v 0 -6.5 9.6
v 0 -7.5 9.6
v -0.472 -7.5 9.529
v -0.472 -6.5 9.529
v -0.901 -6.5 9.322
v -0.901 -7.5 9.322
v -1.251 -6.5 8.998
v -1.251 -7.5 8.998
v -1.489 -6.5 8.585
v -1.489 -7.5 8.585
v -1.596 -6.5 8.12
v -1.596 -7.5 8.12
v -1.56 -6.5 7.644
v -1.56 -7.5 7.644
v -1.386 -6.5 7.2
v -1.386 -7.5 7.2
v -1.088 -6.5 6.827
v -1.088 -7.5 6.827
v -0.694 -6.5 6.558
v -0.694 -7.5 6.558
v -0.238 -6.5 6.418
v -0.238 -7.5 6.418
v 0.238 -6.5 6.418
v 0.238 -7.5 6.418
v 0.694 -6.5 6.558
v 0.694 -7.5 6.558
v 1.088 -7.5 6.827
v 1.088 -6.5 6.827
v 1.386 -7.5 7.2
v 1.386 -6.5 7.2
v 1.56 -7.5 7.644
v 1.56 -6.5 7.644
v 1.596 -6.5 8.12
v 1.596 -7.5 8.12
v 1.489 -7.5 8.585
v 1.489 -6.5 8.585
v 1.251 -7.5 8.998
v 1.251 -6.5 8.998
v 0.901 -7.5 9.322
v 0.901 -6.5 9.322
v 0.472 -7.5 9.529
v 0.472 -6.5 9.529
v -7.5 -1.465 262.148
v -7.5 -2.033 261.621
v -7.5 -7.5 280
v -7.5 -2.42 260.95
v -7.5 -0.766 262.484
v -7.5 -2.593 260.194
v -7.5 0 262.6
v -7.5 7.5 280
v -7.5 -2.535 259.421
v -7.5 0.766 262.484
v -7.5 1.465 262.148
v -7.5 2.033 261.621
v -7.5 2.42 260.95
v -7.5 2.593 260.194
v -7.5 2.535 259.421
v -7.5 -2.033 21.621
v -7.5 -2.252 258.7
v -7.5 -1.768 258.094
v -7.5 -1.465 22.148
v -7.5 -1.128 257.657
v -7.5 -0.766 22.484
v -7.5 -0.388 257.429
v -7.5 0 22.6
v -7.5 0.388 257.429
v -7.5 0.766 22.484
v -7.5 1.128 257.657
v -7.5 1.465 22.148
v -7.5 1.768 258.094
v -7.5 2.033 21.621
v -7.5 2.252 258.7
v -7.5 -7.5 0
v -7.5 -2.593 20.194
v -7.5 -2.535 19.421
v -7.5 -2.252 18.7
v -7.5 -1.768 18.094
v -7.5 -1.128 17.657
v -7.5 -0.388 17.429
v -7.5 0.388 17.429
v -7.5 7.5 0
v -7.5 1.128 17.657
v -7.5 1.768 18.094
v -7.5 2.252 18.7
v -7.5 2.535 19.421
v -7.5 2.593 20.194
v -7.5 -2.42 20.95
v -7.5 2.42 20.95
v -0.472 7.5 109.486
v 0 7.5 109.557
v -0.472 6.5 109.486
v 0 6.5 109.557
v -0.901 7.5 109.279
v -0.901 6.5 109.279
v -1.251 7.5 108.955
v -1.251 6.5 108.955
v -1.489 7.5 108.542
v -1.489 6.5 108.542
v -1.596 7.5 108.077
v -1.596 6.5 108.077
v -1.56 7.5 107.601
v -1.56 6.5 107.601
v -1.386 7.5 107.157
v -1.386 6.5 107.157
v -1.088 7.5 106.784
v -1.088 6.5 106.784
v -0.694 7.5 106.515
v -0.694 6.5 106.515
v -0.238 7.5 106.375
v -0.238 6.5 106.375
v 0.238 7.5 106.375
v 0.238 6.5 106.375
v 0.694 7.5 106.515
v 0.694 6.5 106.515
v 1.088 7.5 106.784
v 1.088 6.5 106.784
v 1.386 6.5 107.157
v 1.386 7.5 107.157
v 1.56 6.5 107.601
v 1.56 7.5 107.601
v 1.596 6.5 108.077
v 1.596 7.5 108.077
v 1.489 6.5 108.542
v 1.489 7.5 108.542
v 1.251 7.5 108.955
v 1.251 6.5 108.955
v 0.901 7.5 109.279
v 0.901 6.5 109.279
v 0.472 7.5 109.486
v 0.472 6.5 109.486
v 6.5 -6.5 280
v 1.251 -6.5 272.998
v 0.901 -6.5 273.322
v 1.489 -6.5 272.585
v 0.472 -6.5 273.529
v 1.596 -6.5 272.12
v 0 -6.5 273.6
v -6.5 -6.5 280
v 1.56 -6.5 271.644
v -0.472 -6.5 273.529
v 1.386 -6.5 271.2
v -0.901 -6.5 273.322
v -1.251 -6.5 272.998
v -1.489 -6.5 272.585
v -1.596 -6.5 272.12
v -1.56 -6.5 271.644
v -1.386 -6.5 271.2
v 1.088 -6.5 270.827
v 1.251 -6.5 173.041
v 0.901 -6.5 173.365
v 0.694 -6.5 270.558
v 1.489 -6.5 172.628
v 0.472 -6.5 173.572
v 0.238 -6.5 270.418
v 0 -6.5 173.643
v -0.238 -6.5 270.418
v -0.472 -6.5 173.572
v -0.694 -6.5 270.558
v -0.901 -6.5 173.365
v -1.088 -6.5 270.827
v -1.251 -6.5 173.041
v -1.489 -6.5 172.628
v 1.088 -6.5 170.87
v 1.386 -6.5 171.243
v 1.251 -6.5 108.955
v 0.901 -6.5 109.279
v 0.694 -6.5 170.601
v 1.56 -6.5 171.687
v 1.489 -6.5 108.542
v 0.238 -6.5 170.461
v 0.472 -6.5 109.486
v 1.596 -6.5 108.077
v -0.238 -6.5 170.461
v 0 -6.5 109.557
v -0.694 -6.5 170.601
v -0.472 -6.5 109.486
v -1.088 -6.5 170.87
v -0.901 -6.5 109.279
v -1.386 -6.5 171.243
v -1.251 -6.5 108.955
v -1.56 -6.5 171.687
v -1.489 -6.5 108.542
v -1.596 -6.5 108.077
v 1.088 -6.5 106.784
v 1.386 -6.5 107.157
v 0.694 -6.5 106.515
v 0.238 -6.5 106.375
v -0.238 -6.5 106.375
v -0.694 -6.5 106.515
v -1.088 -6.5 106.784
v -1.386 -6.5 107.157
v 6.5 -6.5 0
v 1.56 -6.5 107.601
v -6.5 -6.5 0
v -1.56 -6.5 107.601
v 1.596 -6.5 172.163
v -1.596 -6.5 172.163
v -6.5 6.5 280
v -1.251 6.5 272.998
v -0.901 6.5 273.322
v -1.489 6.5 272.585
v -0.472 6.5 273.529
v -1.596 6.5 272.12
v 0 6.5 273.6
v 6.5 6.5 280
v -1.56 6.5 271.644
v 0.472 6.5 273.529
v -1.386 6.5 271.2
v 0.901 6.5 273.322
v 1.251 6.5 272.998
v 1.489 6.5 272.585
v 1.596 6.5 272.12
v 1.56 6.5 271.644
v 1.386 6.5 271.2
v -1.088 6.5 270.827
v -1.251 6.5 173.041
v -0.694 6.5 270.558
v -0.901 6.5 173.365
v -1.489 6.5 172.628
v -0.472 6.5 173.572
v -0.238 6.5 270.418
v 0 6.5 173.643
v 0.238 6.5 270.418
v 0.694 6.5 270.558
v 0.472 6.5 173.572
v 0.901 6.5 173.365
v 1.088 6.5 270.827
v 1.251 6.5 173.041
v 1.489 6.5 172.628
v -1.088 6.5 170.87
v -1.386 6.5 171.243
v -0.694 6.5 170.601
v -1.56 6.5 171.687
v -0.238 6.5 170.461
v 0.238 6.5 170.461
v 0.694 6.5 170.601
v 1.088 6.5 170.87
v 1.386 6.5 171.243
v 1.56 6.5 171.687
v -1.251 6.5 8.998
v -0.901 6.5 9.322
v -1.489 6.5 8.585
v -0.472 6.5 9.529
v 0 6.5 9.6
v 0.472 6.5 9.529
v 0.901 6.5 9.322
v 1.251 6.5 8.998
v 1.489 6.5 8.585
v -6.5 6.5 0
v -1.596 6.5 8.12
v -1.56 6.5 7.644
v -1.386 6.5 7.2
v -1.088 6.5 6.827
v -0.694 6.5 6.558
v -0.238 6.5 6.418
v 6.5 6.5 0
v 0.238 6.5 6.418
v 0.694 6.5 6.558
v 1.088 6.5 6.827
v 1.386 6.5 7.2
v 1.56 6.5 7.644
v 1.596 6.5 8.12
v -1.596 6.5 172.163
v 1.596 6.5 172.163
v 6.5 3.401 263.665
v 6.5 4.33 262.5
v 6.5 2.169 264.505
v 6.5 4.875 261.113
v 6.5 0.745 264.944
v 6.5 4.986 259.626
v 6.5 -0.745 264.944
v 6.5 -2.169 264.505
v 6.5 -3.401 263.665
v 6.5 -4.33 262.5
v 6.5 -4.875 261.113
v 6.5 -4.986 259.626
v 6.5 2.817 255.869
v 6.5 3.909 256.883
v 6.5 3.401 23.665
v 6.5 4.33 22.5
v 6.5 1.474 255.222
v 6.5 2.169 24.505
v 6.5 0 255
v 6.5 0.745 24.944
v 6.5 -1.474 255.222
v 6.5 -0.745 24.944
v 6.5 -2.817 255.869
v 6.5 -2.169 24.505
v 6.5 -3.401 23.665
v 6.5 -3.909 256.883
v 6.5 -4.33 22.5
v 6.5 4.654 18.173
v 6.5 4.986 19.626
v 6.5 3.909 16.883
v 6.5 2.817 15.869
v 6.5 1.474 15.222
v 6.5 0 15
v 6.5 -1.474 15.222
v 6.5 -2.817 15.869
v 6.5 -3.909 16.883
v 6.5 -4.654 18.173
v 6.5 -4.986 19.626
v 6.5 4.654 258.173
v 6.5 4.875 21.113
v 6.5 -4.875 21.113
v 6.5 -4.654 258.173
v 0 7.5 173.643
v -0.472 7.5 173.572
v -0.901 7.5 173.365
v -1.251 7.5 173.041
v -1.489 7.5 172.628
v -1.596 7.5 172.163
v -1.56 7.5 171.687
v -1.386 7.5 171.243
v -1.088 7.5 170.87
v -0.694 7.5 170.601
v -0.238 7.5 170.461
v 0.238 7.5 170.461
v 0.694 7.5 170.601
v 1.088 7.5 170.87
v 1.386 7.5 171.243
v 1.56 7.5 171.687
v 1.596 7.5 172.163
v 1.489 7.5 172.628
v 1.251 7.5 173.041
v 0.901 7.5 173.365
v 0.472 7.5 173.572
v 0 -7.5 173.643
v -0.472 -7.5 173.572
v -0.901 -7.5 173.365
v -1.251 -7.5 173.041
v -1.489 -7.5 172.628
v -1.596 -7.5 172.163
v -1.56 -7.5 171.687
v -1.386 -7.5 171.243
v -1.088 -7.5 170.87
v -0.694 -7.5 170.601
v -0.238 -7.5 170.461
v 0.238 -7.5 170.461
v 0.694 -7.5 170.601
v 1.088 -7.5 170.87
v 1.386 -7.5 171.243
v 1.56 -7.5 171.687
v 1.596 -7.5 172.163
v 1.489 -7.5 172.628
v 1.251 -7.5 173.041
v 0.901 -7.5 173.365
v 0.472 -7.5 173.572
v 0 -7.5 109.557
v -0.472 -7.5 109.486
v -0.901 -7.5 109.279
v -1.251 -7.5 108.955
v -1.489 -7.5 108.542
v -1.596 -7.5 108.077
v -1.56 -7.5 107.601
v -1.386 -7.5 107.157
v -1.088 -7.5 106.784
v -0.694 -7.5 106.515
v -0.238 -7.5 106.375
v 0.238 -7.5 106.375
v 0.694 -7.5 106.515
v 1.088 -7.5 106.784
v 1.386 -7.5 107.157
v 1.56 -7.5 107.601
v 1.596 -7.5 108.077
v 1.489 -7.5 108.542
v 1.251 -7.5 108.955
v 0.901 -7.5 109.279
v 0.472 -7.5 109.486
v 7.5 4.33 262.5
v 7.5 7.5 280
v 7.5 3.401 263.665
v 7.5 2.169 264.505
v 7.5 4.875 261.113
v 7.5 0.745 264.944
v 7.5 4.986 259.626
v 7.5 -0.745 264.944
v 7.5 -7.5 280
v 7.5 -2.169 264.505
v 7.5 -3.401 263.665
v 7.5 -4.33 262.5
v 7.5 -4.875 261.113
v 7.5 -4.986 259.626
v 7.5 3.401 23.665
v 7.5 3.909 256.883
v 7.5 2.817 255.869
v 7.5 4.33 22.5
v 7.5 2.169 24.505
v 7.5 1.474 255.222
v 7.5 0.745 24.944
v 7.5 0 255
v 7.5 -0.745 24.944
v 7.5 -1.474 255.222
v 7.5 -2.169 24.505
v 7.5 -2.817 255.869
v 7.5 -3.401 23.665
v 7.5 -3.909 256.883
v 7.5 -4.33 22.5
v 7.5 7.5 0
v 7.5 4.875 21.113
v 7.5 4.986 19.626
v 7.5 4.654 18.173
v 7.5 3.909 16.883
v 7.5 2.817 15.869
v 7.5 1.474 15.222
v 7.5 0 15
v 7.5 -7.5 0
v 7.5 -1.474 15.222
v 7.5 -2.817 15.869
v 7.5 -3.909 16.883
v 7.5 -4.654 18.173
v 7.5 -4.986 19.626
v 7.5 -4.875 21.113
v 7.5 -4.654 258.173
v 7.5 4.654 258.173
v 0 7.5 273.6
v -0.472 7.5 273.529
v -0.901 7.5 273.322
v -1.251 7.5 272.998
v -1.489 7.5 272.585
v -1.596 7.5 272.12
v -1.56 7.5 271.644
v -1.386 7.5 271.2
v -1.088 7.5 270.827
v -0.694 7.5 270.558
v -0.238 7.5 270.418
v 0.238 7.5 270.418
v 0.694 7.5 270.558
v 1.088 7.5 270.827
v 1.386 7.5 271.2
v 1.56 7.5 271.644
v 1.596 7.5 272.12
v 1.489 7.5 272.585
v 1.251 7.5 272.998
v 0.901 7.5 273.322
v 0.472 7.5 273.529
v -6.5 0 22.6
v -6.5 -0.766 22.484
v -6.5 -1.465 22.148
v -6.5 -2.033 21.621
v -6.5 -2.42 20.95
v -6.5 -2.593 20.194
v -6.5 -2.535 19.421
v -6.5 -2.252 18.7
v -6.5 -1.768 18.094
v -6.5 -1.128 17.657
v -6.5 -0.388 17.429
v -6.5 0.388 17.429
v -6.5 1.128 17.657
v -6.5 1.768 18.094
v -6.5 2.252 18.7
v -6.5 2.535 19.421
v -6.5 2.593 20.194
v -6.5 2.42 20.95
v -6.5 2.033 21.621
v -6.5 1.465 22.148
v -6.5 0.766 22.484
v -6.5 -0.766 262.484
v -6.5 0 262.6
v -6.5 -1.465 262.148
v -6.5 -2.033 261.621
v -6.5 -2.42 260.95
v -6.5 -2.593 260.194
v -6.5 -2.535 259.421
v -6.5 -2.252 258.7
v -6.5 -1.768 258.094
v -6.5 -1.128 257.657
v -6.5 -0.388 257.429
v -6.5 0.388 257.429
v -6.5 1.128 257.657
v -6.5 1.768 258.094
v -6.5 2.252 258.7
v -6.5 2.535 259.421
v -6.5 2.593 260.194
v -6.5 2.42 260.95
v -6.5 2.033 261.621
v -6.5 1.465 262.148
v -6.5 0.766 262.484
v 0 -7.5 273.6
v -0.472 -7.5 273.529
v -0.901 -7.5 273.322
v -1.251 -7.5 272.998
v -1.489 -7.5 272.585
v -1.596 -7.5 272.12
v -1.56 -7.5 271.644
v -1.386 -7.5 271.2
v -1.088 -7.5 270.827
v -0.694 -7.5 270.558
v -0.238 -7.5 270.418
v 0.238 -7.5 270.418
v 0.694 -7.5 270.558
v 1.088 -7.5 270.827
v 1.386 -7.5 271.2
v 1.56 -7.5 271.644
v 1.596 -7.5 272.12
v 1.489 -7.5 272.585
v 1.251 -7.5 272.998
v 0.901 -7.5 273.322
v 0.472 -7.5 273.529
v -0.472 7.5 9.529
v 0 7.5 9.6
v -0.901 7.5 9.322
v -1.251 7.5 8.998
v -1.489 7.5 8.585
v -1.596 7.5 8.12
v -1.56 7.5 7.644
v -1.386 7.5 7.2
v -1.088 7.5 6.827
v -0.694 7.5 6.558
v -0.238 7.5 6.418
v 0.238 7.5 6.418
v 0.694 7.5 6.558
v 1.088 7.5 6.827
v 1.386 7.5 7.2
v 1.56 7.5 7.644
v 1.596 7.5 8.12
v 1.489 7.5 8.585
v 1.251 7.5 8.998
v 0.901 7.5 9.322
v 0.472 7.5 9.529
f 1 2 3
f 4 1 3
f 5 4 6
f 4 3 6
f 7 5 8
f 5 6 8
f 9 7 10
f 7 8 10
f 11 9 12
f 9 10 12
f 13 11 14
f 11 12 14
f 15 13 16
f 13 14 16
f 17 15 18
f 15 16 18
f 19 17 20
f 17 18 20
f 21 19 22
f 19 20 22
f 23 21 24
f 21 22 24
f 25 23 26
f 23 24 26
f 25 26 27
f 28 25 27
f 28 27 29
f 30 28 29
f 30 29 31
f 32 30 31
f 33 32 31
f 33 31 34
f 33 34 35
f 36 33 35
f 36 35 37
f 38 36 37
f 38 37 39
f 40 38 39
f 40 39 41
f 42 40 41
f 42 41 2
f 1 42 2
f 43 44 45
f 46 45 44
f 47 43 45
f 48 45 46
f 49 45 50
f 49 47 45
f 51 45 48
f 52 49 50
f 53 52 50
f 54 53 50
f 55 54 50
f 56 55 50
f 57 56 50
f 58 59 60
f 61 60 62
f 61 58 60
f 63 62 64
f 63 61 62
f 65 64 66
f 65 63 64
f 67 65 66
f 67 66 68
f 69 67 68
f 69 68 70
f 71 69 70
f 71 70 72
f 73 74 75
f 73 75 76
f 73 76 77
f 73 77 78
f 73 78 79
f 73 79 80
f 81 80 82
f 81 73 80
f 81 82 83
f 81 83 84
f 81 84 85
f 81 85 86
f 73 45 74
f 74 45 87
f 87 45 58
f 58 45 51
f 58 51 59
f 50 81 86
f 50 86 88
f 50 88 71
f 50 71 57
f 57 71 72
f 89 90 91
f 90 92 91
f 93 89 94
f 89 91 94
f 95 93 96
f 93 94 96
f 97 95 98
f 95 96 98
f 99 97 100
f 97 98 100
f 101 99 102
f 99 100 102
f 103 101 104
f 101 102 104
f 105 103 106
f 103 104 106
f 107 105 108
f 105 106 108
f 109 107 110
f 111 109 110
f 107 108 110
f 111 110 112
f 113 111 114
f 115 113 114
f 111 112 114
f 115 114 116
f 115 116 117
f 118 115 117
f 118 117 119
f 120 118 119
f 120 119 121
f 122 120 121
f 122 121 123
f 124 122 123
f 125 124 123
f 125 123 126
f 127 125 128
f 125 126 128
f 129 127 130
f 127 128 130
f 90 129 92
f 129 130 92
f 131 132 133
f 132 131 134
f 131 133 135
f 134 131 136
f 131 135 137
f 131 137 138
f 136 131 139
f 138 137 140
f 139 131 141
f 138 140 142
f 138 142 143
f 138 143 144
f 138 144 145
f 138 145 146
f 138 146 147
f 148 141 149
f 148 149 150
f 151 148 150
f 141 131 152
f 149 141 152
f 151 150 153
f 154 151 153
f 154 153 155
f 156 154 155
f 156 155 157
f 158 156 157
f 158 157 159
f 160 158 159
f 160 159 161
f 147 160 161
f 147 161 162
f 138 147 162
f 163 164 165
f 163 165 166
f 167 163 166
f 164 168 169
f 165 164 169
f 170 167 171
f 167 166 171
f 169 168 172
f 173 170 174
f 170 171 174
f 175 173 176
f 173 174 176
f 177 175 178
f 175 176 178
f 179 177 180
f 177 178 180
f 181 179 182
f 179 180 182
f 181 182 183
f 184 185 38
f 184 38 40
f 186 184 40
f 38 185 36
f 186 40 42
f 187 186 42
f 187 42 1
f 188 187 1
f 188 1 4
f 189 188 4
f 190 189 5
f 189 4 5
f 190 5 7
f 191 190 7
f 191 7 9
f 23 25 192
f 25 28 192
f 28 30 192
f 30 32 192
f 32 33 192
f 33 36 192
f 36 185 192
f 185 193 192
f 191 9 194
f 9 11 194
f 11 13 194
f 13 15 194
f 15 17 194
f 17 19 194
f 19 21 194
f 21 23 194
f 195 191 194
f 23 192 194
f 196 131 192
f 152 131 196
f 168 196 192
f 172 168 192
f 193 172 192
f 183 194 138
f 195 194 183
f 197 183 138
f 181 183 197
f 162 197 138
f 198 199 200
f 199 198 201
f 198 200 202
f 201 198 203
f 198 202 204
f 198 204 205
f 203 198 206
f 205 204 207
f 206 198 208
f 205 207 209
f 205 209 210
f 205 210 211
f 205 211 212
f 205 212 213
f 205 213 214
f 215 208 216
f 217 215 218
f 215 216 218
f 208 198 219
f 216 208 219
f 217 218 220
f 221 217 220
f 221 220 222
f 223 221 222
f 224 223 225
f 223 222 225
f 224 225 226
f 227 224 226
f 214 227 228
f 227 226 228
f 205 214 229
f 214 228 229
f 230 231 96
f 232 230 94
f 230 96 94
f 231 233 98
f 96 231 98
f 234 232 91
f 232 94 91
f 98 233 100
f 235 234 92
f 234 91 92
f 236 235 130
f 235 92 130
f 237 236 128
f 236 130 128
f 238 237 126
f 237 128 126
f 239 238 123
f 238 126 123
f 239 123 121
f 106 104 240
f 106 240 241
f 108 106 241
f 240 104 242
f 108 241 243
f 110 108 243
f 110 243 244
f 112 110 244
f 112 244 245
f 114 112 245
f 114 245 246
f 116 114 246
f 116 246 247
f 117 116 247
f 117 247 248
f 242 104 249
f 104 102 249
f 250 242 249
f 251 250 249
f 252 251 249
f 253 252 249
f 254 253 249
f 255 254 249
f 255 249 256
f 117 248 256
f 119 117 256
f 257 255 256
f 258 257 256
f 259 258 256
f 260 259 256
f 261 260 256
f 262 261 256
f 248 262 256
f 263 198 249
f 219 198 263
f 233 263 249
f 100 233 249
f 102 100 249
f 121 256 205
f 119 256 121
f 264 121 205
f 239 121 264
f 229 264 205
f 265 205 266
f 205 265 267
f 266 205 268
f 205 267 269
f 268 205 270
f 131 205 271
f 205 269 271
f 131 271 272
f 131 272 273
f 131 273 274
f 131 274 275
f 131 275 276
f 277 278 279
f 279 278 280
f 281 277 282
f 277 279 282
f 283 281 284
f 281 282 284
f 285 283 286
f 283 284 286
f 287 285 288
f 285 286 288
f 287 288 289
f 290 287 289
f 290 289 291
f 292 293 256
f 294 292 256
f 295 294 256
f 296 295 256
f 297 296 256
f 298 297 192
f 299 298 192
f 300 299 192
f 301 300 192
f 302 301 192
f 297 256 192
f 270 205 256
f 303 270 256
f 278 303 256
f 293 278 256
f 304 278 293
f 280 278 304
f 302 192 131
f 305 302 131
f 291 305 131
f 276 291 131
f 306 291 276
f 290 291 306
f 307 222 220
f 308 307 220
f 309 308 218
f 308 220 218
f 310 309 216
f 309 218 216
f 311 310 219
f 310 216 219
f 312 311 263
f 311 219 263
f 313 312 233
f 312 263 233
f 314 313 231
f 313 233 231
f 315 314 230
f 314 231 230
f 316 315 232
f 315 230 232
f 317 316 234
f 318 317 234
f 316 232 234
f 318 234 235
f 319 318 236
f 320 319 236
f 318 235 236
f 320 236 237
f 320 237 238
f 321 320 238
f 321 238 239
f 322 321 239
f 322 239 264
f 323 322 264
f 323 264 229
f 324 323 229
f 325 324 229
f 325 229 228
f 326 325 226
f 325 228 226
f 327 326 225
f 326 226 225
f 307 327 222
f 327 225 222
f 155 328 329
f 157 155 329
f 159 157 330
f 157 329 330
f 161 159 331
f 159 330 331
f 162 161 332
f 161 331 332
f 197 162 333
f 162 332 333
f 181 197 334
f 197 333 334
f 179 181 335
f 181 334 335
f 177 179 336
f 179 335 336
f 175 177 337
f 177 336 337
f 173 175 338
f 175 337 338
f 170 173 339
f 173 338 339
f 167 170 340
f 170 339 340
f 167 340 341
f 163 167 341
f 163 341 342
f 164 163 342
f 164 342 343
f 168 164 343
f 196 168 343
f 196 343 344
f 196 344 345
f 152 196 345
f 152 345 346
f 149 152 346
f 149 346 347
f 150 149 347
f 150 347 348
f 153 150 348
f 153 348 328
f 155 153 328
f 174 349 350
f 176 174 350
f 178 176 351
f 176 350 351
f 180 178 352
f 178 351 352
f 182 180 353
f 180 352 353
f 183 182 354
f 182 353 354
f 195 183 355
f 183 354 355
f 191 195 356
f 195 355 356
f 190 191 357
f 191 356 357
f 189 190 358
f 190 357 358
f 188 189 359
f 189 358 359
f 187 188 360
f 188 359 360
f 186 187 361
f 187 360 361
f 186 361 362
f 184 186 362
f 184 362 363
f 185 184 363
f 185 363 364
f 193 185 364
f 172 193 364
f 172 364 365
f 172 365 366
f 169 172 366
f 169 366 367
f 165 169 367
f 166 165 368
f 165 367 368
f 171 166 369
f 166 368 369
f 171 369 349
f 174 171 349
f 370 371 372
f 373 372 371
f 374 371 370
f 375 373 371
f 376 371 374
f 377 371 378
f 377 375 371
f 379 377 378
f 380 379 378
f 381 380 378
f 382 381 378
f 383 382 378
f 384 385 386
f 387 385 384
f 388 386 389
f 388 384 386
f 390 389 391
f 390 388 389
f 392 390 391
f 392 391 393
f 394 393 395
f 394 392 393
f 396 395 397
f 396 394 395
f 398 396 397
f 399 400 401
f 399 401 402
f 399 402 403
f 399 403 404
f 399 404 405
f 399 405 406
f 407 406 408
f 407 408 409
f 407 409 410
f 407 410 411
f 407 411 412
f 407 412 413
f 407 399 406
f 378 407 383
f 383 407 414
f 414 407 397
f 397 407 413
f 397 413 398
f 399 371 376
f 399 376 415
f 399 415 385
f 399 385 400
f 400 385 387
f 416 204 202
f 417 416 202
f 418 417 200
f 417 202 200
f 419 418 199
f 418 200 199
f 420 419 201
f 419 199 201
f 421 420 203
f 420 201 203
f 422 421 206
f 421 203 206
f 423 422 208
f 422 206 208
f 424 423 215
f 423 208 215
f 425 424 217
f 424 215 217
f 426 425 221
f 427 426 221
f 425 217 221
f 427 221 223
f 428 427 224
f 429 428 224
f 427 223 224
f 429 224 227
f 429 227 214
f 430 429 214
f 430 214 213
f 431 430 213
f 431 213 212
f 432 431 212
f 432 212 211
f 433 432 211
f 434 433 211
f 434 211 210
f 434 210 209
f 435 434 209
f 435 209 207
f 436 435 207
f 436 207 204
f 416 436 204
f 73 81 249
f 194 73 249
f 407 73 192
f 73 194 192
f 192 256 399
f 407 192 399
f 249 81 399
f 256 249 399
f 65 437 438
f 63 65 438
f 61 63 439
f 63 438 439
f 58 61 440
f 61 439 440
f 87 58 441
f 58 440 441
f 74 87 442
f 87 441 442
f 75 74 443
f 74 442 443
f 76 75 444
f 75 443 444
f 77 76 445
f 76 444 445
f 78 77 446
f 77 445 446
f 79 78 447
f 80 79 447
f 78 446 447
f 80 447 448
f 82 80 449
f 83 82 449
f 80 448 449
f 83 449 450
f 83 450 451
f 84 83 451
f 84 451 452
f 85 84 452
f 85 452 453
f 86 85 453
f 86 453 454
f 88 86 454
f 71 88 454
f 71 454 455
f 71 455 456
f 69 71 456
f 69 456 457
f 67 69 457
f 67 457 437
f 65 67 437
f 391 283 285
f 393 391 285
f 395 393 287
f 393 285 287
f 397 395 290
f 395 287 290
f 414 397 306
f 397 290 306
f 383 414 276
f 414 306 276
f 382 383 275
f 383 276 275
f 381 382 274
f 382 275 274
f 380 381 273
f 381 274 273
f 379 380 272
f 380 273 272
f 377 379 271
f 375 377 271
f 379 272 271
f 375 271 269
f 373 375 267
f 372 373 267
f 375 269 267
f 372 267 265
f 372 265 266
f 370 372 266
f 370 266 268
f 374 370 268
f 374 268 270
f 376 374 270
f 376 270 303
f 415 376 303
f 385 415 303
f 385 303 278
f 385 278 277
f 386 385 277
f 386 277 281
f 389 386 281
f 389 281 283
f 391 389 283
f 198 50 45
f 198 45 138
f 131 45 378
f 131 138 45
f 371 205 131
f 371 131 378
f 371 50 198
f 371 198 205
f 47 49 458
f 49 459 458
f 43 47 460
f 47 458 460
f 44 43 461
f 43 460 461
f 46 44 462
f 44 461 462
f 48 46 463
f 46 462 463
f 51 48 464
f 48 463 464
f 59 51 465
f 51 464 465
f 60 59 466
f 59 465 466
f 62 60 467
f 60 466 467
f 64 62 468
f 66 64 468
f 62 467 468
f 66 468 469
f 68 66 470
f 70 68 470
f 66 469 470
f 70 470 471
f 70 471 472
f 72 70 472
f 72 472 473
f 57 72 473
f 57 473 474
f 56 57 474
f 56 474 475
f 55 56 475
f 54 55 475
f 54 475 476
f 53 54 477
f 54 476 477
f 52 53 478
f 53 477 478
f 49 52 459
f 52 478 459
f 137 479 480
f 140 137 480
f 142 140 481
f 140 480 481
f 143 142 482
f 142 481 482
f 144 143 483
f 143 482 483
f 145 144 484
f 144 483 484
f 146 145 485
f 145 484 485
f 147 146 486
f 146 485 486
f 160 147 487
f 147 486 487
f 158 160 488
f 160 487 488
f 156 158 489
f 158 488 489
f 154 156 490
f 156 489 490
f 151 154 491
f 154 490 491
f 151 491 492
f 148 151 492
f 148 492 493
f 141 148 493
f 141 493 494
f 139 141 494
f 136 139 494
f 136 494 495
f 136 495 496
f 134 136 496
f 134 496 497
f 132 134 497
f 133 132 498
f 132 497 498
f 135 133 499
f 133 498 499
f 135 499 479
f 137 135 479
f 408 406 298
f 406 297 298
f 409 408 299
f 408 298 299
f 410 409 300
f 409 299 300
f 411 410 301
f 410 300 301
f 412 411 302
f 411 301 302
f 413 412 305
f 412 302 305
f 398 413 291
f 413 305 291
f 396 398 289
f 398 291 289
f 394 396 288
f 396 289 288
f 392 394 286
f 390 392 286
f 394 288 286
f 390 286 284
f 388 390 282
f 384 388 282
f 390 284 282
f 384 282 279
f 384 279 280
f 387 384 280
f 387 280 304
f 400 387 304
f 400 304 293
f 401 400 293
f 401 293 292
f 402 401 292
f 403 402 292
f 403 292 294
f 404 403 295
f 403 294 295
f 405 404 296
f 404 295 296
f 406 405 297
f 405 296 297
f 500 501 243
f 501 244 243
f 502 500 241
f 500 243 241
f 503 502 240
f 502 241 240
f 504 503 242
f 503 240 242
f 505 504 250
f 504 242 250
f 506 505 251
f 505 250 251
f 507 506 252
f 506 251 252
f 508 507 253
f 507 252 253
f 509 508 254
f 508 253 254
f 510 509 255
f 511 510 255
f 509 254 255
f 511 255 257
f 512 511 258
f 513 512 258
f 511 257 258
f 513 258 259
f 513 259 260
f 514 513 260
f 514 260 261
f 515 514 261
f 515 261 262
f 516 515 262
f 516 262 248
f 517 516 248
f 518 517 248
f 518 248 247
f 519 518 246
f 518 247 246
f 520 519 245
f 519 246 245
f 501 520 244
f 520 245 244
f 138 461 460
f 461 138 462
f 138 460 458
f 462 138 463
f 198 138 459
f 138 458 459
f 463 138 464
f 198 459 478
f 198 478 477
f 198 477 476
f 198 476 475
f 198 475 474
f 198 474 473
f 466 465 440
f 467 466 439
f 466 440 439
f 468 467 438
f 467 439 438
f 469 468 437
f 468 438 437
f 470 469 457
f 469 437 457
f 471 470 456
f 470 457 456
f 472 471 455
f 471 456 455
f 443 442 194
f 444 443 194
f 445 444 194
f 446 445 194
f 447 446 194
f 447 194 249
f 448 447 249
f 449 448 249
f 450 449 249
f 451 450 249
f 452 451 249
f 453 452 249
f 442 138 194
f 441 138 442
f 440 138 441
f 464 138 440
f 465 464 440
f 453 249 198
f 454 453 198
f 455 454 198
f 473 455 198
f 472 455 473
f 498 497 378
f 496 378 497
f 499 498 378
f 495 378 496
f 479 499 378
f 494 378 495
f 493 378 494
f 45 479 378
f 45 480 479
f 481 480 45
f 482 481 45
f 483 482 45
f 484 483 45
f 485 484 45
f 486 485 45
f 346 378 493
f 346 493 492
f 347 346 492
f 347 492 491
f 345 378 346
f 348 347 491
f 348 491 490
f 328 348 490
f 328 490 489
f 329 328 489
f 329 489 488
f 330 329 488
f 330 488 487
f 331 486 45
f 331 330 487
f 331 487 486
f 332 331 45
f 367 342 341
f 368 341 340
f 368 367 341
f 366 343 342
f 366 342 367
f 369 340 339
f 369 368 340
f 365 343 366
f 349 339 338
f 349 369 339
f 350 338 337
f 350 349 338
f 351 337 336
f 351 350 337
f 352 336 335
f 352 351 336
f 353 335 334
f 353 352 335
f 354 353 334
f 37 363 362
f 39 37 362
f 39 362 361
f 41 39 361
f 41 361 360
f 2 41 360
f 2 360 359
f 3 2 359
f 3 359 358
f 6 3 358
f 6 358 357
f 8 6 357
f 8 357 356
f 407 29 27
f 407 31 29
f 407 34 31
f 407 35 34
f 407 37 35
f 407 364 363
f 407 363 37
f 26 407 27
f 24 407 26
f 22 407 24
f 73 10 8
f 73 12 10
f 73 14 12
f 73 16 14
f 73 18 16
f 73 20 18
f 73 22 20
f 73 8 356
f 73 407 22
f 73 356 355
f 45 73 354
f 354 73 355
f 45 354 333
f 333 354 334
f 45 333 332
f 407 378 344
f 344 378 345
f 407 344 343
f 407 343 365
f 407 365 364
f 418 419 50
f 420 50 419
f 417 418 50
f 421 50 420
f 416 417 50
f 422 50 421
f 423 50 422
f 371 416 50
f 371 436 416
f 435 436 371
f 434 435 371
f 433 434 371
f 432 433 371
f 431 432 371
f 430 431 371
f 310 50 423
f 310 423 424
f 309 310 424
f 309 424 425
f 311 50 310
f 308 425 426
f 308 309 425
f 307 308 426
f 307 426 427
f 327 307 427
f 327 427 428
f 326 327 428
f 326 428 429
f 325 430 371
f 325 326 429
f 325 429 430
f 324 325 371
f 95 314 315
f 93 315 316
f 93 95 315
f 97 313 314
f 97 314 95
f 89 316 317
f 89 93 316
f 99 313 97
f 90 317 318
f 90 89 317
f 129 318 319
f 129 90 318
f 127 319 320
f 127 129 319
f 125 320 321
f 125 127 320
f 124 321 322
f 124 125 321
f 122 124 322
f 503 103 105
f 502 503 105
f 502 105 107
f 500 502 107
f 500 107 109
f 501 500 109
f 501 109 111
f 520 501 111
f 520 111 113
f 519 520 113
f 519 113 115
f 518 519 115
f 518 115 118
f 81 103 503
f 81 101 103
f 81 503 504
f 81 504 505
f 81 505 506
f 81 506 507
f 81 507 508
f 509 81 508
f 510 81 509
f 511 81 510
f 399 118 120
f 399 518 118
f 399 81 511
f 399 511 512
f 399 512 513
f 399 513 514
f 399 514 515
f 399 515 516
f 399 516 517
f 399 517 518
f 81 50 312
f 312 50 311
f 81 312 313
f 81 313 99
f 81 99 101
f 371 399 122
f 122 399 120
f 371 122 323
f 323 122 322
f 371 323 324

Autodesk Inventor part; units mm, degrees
ref_plane "YZ Plane" through (0, 0, 0) normal (1, 0, 0) x (0, 1, 0)
ref_plane "XZ Plane" through (0, 0, 0) normal (0, 1, 0) x (-1, 0, 0)
ref_plane "XY Plane" through (0, 0, 0) normal (0, 0, 1) x (1, 0, 0)
sketch "スケッチ1" plane through (0, 0, 0) normal (0, 0, 1) x (1, 0, 0)
  line L0 (7.5, -7.5) -> (-7.5, -7.5)
  line L1 (-7.5, -7.5) -> (-7.5, 7.5)
  line L2 (-7.5, 7.5) -> (7.5, 7.5)
  line L3 (7.5, 7.5) -> (7.5, -7.5)
  line L4 (7.5, -7.5) -> (-7.5, 7.5) construction
  line L5 (-7.5, -7.5) -> (7.5, 7.5) construction
  point P0 (0, 0)
  dimension "d0" = 15
  dimension "d1" = 15
extrude "押し出し1" add sketch "スケッチ1" along normal blind 280
shell "シェル1" thickness 1 removed faces 2 at (2.5, -2.5, 0) at (2.5, -2.5, 280)
sketch "スケッチ2" plane through (-7.5, 7.5, 0) normal (0, 1, 0) x (1, 0, 0)
  line L0 (7.5, -172.043) -> (7.5, -107.957) construction
  line L1 (15, -280) -> (0, -280) projected
  line L2 (0, 0) -> (0, -280) projected
  line L3 (0, -140) -> (7.5, -140) construction
  point P0 (7.5, 0)
  point P1 (7.5, -280)
  point P2 (7.5, -272)
  point P3 (7.5, -8)
  dimension "d5" = 64.086
  dimension "d29" = 264
hole "穴1" at (0, 7.5, 172.043) at (0, 7.5, 107.957) at (0, 7.5, 272) at (0, 7.5, 8) direction (0, -1, 0) diameter 3.2 end through all
sketch "スケッチ3" plane through (-7.5, -7.5, 0) normal (-1, 0, 0) x (0, 0, 1)
  line L0 (20, 7.5) -> (260, 7.5)
  line L1 (0, 15) -> (280, 15) projected
  line L2 (280, 15) -> (280, 0) projected
  point P0 (0, 7.5)
  point P1 (140, 7.5)
  point P2 (140, 15)
  point P3 (280, 7.5)
  dimension "d13" = 240
hole "穴2" at (-7.5, 0, 260) at (-7.5, 0, 20) direction (1, 0, 0) diameter 5.2 depth 1 tip angle 118
sketch "スケッチ4" plane through (7.5, -7.5, 0) normal (1, 0, 0) x (0, 0, -1)
  circle A0 centre (-260, 7.5) radius 2.6 projected
  circle A1 centre (-20, 7.5) radius 2.6 projected
  line L0 (0, 0) -> (0, 15) projected
  line L1 (0, 0) -> (-280, 0) projected
  line L2 (-280, 15) -> (-280, 0) projected
  line L3 (0, 15) -> (-280, 15) projected
  point P0 (0, 7.5)
hole "穴3" at (7.5, 0, 20) at (7.5, 0, 260) direction (-1, 0, 0) diameter 10 depth 1 tip angle 118
properties part number "BaseSlideSTOPPERsq"
